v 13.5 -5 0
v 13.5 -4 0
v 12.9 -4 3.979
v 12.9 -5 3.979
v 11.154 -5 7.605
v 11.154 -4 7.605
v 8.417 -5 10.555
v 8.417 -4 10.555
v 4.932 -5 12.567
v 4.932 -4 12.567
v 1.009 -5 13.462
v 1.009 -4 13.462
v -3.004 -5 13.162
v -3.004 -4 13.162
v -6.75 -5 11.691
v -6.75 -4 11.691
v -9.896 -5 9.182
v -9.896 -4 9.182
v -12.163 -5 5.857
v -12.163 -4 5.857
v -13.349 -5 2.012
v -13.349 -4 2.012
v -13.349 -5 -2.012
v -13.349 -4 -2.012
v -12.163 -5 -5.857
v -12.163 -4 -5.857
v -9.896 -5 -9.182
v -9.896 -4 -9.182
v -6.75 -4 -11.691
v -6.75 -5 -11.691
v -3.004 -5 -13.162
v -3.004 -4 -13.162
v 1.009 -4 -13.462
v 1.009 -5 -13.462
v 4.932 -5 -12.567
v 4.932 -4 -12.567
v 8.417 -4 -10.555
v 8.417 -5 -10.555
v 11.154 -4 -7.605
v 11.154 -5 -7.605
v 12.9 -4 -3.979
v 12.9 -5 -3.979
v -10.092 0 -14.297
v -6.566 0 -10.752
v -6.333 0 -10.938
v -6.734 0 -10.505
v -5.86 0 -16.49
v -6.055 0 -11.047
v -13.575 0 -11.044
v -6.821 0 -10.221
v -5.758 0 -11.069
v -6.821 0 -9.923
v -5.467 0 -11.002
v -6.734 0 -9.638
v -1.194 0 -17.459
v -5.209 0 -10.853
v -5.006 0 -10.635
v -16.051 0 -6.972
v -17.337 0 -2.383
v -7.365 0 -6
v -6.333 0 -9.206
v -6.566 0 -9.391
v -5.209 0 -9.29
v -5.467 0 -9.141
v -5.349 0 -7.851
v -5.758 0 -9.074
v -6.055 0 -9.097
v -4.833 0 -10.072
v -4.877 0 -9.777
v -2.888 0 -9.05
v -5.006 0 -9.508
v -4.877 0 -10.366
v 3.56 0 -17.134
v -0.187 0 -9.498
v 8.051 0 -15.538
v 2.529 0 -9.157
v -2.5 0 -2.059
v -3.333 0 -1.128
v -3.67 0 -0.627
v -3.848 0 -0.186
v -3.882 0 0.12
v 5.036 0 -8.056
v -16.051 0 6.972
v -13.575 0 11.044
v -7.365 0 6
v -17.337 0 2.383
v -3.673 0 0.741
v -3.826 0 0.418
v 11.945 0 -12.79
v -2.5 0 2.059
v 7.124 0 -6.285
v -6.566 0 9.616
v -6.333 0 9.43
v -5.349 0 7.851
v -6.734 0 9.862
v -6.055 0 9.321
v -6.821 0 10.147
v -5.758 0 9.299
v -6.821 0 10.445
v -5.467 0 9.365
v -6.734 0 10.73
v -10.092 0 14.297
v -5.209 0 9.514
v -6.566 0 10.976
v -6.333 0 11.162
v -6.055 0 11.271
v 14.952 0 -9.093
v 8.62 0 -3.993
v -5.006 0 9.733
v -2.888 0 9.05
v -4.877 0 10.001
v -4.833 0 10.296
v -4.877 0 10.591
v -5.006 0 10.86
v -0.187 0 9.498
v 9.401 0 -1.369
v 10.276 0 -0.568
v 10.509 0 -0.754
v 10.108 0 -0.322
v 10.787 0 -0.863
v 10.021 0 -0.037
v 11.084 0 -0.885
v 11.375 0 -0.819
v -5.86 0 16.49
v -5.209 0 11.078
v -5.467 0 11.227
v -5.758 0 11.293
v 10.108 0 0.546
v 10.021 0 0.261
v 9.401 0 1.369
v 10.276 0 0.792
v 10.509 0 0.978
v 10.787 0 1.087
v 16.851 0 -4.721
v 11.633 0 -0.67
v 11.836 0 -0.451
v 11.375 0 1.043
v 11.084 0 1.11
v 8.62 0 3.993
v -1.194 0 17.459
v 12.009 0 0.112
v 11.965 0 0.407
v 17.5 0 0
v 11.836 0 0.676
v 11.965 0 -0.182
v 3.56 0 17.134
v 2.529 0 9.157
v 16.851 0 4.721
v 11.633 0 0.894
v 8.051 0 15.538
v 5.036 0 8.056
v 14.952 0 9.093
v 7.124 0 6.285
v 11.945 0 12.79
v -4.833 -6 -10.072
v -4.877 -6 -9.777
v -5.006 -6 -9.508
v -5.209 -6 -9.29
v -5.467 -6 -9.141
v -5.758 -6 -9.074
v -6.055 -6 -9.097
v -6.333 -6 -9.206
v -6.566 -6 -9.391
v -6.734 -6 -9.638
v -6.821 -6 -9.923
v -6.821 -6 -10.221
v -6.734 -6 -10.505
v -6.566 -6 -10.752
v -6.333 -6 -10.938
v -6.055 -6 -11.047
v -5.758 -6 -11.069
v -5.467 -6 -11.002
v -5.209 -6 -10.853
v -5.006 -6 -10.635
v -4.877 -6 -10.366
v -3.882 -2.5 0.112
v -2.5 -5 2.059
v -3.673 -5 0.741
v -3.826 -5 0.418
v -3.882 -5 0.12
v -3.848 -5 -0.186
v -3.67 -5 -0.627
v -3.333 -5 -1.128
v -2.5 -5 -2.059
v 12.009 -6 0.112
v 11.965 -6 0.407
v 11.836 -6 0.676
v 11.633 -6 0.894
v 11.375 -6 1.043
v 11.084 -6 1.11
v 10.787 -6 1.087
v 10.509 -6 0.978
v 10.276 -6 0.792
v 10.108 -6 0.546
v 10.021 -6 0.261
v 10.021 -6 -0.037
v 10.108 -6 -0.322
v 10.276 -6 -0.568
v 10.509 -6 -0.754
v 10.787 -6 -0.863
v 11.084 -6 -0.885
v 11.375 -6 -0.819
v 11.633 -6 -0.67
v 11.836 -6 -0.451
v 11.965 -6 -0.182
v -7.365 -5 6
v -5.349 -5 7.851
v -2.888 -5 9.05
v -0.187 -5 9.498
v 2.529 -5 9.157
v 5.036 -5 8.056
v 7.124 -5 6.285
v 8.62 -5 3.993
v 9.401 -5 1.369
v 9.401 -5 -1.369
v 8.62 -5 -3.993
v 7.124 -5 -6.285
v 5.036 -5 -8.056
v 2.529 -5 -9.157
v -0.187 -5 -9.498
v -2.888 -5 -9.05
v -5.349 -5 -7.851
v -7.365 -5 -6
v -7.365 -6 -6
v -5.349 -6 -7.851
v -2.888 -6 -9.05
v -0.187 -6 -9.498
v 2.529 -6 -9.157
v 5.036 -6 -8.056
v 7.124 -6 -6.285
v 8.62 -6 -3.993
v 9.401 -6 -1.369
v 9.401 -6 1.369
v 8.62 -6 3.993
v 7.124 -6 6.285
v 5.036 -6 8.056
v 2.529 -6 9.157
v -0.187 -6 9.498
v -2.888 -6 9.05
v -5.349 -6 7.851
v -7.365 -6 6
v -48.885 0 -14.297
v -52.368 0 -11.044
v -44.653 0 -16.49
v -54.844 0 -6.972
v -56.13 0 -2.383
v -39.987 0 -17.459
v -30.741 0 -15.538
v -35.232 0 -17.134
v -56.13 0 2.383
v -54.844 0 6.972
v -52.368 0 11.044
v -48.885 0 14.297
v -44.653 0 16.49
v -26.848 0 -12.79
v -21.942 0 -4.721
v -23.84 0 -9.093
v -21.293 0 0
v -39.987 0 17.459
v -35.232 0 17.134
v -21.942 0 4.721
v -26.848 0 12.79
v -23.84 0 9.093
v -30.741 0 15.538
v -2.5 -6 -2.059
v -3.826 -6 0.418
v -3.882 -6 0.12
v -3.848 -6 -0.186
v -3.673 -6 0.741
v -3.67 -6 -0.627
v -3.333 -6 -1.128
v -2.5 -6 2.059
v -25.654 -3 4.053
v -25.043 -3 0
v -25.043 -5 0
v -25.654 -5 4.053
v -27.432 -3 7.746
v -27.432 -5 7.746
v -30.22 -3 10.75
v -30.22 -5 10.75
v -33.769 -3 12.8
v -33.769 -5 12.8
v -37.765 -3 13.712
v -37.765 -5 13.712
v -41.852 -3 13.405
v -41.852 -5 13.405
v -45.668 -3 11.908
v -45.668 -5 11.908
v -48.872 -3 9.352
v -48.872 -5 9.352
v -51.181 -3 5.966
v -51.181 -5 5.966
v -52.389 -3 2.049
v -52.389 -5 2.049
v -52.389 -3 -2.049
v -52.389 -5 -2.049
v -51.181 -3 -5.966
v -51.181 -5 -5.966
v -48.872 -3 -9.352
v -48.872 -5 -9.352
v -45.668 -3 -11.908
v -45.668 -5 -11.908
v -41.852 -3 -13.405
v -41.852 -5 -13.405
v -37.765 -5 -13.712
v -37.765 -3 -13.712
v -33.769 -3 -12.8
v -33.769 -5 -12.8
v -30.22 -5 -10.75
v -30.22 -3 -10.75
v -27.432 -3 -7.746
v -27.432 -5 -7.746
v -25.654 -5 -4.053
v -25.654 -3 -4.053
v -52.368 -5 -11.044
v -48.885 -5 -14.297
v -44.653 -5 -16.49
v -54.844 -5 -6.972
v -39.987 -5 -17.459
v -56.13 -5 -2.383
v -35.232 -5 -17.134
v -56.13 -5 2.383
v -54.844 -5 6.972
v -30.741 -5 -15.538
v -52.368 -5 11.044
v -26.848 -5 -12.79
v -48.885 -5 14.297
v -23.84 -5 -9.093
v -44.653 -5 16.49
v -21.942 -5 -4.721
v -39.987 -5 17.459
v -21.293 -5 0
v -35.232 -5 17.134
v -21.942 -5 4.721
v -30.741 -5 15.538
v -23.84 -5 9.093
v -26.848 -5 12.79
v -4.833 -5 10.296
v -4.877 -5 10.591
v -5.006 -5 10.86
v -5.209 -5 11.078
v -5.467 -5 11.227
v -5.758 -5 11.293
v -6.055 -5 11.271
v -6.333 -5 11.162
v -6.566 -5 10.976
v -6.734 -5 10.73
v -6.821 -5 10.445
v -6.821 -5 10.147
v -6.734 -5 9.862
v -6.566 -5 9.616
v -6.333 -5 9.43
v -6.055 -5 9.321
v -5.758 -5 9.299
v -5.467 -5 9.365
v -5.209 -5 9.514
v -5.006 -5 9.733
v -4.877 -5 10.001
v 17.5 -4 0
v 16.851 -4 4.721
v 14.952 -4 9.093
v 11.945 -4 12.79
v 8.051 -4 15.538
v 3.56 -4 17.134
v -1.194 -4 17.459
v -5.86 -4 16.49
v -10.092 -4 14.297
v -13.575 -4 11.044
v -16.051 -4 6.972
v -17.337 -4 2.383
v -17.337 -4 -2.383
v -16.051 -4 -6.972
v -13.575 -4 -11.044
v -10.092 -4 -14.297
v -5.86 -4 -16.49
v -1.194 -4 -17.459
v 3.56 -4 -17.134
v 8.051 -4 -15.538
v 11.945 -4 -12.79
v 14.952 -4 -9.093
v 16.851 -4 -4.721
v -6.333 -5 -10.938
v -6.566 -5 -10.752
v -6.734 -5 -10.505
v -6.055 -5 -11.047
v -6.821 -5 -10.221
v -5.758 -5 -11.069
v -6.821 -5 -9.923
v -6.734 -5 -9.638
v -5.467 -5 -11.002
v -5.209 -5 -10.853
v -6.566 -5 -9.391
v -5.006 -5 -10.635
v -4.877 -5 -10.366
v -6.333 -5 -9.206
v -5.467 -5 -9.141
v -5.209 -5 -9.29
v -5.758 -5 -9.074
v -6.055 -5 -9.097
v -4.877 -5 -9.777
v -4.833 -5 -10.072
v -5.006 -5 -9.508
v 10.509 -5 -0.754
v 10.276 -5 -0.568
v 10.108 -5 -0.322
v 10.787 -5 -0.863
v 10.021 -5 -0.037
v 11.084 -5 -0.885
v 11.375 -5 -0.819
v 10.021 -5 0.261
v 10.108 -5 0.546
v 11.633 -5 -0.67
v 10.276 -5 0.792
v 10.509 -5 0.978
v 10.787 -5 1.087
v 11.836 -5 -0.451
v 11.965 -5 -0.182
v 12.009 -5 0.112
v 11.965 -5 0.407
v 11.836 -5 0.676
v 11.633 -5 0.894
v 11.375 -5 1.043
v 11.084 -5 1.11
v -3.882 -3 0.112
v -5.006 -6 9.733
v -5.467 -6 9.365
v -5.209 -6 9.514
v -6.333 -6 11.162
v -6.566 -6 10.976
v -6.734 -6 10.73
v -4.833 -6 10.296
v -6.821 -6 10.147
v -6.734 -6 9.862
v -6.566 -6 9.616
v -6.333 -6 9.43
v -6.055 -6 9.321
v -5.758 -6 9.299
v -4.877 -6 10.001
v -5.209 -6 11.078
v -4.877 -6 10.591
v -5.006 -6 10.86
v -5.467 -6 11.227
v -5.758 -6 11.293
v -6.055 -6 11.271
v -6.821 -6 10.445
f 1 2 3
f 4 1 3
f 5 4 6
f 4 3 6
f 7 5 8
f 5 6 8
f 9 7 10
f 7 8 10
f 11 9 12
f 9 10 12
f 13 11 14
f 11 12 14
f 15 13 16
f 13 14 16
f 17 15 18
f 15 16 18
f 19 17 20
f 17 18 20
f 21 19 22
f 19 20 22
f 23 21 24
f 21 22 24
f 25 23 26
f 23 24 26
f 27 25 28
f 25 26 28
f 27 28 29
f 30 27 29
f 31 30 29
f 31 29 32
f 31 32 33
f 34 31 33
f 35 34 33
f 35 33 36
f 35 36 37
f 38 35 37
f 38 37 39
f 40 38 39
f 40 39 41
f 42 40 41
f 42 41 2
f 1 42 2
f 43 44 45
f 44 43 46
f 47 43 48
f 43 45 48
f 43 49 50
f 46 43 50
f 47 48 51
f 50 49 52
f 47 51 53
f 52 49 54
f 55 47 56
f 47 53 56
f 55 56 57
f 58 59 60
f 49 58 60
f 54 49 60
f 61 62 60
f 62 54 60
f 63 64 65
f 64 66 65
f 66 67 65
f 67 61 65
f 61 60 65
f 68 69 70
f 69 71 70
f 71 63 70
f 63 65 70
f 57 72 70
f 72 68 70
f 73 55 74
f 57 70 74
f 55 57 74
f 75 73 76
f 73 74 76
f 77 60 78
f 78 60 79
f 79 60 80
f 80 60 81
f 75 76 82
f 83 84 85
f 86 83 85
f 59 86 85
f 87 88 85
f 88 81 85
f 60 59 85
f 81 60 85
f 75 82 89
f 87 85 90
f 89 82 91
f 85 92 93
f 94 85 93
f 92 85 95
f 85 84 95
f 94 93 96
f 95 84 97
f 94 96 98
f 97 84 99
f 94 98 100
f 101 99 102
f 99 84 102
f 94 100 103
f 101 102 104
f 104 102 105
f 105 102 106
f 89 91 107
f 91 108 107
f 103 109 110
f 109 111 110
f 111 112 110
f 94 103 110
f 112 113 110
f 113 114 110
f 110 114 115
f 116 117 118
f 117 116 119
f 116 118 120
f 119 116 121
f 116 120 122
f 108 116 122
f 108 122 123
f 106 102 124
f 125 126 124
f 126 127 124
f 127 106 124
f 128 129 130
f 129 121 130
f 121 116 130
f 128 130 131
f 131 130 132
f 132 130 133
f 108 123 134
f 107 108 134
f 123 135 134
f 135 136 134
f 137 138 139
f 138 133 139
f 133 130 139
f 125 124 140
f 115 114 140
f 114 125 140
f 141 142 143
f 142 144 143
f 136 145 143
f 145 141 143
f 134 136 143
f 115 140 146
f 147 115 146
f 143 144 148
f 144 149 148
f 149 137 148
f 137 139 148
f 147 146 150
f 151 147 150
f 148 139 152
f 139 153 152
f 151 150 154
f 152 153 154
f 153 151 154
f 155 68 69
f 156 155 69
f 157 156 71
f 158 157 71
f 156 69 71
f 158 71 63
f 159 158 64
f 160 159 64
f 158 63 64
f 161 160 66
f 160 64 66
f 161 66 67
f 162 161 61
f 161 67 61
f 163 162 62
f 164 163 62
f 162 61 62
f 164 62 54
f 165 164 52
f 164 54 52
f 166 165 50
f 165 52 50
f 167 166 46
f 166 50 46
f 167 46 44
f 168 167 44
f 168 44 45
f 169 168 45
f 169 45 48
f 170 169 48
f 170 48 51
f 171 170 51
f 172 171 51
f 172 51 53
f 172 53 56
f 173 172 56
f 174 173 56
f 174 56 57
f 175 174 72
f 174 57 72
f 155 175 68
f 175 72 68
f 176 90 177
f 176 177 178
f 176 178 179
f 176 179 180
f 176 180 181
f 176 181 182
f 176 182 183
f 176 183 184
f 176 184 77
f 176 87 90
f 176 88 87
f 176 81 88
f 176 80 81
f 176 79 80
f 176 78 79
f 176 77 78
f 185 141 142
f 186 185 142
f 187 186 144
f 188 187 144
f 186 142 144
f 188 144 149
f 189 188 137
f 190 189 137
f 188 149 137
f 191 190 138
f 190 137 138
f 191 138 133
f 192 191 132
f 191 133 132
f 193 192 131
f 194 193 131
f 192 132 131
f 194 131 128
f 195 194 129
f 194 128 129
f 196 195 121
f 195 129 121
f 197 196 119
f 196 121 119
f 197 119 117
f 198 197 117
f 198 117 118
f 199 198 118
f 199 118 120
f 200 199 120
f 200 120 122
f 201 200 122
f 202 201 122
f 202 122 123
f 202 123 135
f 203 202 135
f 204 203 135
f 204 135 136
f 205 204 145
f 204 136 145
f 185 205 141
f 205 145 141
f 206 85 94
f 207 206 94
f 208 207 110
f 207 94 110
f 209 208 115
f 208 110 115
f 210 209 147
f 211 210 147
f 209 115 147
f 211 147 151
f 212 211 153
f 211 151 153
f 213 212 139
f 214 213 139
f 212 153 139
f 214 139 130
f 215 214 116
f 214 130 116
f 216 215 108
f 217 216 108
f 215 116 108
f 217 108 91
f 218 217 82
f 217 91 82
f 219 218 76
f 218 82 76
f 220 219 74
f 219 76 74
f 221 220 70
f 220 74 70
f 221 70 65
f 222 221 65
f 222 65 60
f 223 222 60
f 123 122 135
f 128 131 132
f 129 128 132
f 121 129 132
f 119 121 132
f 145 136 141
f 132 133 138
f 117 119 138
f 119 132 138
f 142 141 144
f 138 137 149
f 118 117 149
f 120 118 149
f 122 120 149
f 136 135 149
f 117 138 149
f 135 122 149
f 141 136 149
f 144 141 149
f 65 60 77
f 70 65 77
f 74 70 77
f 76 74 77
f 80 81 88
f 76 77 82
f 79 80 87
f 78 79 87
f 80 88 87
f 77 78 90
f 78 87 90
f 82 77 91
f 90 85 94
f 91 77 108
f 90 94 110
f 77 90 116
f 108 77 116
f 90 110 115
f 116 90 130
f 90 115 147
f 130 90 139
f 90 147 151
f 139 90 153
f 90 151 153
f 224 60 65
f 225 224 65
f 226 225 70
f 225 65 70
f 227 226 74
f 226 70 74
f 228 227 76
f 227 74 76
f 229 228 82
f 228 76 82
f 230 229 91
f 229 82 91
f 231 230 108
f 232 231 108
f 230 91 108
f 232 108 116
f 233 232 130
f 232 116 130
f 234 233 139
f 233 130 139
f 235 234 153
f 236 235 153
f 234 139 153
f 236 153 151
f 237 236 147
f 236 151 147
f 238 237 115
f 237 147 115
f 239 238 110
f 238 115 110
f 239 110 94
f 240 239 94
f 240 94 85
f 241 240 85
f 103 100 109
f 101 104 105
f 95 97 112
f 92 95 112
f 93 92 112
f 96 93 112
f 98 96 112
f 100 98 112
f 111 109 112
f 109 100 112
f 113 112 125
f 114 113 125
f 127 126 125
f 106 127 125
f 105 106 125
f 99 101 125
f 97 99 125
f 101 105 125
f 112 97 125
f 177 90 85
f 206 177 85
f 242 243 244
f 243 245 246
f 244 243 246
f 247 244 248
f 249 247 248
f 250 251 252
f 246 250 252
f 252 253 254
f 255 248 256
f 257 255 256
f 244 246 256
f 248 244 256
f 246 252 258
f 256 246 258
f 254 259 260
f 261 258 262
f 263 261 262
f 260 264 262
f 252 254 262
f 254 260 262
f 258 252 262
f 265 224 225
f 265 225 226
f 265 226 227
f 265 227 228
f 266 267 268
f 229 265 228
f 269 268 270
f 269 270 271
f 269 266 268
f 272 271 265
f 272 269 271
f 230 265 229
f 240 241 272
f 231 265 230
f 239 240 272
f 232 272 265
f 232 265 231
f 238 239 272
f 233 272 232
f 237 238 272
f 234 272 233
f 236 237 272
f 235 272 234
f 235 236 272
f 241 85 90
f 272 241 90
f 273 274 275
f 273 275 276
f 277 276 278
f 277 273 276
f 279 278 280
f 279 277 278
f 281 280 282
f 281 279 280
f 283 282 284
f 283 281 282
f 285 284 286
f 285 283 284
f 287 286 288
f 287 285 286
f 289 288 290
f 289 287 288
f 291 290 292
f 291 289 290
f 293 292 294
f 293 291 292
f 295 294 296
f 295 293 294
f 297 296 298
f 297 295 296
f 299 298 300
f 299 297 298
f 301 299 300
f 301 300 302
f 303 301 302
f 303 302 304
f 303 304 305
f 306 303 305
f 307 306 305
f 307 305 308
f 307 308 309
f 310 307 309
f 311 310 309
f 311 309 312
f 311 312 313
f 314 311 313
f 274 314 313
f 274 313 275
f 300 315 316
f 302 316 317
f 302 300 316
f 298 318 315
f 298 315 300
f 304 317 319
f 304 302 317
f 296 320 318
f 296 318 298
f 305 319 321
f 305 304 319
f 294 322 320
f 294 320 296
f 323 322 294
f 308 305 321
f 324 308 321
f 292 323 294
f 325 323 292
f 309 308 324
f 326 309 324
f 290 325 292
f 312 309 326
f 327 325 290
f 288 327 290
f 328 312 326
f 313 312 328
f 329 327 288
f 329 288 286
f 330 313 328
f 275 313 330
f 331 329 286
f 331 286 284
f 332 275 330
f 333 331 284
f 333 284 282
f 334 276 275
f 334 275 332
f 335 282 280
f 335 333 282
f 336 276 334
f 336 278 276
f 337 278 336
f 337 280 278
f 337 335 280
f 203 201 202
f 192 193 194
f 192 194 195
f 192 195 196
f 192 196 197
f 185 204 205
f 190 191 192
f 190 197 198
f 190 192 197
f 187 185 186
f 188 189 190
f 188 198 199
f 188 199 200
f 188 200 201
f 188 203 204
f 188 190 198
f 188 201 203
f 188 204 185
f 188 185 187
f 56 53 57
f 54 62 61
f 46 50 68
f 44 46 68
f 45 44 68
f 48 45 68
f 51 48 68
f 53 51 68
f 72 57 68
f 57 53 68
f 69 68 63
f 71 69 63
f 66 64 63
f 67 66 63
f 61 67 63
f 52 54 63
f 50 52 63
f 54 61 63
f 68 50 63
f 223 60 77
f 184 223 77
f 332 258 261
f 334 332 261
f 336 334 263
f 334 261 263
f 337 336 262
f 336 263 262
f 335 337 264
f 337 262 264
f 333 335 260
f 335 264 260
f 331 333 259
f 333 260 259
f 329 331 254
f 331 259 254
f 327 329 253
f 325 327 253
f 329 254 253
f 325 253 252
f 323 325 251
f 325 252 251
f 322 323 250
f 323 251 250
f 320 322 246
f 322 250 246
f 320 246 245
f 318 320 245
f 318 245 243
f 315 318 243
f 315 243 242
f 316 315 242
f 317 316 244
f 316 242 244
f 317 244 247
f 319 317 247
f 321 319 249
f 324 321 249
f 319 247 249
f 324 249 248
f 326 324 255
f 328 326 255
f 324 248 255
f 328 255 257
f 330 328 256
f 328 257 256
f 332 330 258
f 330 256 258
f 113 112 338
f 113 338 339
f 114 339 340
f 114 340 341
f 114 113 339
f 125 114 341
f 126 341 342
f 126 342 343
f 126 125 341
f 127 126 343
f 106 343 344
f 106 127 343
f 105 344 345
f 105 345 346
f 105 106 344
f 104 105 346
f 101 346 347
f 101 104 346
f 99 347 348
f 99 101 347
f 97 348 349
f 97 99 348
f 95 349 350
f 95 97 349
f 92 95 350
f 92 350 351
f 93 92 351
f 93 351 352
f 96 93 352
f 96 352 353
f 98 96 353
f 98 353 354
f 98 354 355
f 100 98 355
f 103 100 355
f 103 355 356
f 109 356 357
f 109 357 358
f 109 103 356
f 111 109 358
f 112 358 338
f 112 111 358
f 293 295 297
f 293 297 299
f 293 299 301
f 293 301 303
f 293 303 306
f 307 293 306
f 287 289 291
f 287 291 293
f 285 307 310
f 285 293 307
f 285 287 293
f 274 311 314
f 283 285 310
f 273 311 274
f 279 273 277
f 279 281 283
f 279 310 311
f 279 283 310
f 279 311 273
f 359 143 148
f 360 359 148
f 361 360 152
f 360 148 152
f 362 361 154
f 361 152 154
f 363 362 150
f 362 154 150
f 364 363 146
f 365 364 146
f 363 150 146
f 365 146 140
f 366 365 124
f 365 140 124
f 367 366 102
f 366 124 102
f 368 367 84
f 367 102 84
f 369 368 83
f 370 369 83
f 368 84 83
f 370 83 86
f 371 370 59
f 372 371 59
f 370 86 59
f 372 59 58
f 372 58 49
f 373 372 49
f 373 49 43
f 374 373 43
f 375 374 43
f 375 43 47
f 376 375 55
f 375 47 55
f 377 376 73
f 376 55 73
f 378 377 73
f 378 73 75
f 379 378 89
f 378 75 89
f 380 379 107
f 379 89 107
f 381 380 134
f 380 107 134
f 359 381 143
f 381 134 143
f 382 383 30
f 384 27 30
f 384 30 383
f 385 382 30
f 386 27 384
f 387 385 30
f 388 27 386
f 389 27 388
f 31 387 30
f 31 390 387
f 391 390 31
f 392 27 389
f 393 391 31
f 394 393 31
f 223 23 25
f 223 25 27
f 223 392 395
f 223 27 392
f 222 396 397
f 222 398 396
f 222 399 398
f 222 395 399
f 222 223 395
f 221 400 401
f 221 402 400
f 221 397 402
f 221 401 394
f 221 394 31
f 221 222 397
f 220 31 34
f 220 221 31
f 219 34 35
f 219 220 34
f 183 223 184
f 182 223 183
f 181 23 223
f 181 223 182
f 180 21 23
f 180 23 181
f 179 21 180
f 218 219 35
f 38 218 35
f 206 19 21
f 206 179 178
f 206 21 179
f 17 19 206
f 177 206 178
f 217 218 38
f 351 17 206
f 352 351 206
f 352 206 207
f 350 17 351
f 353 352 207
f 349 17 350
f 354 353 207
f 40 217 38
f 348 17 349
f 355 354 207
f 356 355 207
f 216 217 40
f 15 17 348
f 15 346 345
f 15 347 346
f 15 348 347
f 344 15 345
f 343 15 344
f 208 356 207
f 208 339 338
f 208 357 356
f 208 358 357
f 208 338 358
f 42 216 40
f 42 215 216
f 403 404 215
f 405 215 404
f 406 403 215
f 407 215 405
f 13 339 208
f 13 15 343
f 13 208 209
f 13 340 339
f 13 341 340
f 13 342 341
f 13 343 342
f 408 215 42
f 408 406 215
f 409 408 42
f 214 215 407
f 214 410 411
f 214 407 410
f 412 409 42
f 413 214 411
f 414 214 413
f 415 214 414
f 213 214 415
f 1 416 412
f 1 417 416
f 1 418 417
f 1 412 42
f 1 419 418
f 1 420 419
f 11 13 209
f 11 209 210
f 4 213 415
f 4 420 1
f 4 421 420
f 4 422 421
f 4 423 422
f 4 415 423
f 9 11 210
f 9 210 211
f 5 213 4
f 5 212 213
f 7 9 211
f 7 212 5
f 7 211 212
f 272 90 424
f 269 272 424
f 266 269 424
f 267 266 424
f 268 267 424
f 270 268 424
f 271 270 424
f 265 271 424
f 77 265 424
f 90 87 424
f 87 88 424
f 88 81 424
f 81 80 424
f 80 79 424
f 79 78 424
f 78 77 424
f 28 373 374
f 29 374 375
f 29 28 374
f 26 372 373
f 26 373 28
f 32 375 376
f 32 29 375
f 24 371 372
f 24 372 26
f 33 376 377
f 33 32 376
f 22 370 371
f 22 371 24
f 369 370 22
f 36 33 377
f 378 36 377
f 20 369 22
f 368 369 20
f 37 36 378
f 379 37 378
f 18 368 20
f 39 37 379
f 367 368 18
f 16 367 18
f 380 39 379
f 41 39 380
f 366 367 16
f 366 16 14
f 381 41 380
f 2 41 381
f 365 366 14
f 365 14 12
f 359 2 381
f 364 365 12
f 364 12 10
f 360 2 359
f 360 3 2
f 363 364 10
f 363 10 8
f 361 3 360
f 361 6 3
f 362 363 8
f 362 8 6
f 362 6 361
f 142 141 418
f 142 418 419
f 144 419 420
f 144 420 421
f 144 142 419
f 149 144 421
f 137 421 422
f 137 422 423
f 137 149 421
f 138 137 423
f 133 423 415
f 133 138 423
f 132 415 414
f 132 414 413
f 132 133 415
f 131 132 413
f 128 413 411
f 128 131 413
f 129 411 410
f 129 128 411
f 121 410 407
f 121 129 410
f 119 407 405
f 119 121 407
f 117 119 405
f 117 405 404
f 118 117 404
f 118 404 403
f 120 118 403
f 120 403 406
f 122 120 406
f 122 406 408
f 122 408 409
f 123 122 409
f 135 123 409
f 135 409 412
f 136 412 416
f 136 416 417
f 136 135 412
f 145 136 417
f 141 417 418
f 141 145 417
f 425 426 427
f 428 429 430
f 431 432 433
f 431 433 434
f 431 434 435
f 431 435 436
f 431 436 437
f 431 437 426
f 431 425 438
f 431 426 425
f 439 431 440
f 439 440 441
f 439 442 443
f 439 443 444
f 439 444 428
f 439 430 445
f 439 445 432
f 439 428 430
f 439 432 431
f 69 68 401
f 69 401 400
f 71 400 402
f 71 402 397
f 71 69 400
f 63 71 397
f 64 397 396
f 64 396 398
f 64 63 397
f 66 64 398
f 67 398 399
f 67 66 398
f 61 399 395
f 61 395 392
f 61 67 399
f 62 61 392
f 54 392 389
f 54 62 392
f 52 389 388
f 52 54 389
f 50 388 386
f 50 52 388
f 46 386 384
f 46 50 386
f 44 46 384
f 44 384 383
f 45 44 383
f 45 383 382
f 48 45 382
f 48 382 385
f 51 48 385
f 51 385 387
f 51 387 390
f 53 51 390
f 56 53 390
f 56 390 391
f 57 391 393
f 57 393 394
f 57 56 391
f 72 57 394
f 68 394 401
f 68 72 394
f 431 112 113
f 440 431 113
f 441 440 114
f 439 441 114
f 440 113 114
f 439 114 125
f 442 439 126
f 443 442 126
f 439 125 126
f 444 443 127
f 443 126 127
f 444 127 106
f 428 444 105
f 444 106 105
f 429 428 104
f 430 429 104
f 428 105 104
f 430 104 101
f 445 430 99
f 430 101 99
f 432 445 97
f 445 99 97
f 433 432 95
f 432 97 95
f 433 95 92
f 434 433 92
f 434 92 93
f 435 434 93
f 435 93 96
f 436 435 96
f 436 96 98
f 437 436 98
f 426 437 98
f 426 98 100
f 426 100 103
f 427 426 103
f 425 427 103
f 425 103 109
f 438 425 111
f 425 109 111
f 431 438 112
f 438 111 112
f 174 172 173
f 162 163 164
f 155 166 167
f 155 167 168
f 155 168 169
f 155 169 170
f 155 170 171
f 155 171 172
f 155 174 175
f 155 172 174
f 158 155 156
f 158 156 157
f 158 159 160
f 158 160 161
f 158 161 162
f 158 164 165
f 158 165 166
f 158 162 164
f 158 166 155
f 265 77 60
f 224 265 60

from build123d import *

# Parameters (mm, degrees)
F1_DEPTH = 6
F0_R     = 1
F0_R_2   = 13.5
F2_DEPTH = 5
F0_R_3   = 17.5
F3_DEPTH = 4
F0_R_4   = 13.75
F4_DEPTH = 3
F5_DEPTH = 5


with BuildPart() as f1:
    # F0 (on Front) → F1 (new body)
    with BuildSketch(Plane.XZ):
        with BuildLine():
            ThreePointArc((-7.3654599313, -6), (9.5, 0), (-7.3654599313, 6))
            Line((-7.3654599313, 6), (-2.5, 2.058527898))
            add(Edge.make_bspline(
                [(-2.5, 2.058527898), (-3.1436924417, 1.385275305), (-4.6090135142, 0.1602034872), (-3.1683911991, -1.3597404302), (-2.5, -2.059)],
                knots=[0, 0, 0, 0, 0.4905811714, 1, 1, 1, 1], degree=3))
            Line((-2.5, -2.059), (-7.3654599313, -6))
        make_face()
    extrude(amount=F1_DEPTH)


with BuildPart() as f1b:
    # F0 (on Front) → F1, piece 2 (new body)
    with BuildSketch(Plane.XZ):
        with Locations((-5.8326675472, 10.2962186598)):
            Circle(F0_R)
    extrude(amount=F1_DEPTH)


with BuildPart() as f1c:
    # F0 (on Front) → F1, piece 3 (new body)
    with BuildSketch(Plane.XZ):
        with Locations((-5.8326675472, -10.0715903886)):
            Circle(F0_R)
    extrude(amount=F1_DEPTH)


with BuildPart() as f1d:
    # F0 (on Front) → F1, piece 4 (new body)
    with BuildSketch(Plane.XZ):
        with Locations((11.009437716, 0.1123141356)):
            Circle(F0_R)
    extrude(amount=F1_DEPTH)


with BuildPart() as f2:
    # F0 (on Front) → F2 (new body)
    with BuildSketch(Plane.XZ):
        Circle(F0_R_2)
        with Locations((-5.8326675472, -10.0715903886)):
            Circle(F0_R, mode=Mode.SUBTRACT)
        with BuildLine():
            Line((-2.5, 2.058527898), (-7.3654599313, 6))
            ThreePointArc((-7.3654599313, 6), (9.5, 0), (-7.3654599313, -6))
            Line((-7.3654599313, -6), (-2.5, -2.059))
            add(Edge.make_bspline(
                [(-2.5, 2.058527898), (-3.1436924417, 1.385275305), (-4.6090135142, 0.1602034872), (-3.1683911991, -1.3597404302), (-2.5, -2.059)],
                knots=[0, 0, 0, 0, 0.4905811714, 1, 1, 1, 1], degree=3))
        make_face(mode=Mode.SUBTRACT)
        with Locations((11.009437716, 0.1123141356)):
            Circle(F0_R, mode=Mode.SUBTRACT)
        with Locations((-5.8326675472, 10.2962186598)):
            Circle(F0_R, mode=Mode.SUBTRACT)
    extrude(amount=F2_DEPTH)

    # F0 (on Front) → F3 (join)
    with BuildSketch(Plane.XZ):
        Circle(F0_R_3)
        Circle(F0_R_2, mode=Mode.SUBTRACT)
    extrude(amount=F3_DEPTH)


with BuildPart() as f4:
    # F0 (on Front) → F4 (new body)
    with BuildSketch(Plane.XZ):
        with Locations((-38.7926362455, 0)):
            Circle(F0_R_4)
    extrude(amount=F4_DEPTH)

    # F0 (on Front) → F5 (join)
    with BuildSketch(Plane.XZ):
        with Locations((-38.7926362455, 0)):
            Circle(F0_R_3)
        with Locations((-38.7926362455, 0)):
            Circle(F0_R_4, mode=Mode.SUBTRACT)
    extrude(amount=F5_DEPTH)


solid = Compound([f1.part, f1b.part, f1c.part, f1d.part, f2.part, f4.part])
